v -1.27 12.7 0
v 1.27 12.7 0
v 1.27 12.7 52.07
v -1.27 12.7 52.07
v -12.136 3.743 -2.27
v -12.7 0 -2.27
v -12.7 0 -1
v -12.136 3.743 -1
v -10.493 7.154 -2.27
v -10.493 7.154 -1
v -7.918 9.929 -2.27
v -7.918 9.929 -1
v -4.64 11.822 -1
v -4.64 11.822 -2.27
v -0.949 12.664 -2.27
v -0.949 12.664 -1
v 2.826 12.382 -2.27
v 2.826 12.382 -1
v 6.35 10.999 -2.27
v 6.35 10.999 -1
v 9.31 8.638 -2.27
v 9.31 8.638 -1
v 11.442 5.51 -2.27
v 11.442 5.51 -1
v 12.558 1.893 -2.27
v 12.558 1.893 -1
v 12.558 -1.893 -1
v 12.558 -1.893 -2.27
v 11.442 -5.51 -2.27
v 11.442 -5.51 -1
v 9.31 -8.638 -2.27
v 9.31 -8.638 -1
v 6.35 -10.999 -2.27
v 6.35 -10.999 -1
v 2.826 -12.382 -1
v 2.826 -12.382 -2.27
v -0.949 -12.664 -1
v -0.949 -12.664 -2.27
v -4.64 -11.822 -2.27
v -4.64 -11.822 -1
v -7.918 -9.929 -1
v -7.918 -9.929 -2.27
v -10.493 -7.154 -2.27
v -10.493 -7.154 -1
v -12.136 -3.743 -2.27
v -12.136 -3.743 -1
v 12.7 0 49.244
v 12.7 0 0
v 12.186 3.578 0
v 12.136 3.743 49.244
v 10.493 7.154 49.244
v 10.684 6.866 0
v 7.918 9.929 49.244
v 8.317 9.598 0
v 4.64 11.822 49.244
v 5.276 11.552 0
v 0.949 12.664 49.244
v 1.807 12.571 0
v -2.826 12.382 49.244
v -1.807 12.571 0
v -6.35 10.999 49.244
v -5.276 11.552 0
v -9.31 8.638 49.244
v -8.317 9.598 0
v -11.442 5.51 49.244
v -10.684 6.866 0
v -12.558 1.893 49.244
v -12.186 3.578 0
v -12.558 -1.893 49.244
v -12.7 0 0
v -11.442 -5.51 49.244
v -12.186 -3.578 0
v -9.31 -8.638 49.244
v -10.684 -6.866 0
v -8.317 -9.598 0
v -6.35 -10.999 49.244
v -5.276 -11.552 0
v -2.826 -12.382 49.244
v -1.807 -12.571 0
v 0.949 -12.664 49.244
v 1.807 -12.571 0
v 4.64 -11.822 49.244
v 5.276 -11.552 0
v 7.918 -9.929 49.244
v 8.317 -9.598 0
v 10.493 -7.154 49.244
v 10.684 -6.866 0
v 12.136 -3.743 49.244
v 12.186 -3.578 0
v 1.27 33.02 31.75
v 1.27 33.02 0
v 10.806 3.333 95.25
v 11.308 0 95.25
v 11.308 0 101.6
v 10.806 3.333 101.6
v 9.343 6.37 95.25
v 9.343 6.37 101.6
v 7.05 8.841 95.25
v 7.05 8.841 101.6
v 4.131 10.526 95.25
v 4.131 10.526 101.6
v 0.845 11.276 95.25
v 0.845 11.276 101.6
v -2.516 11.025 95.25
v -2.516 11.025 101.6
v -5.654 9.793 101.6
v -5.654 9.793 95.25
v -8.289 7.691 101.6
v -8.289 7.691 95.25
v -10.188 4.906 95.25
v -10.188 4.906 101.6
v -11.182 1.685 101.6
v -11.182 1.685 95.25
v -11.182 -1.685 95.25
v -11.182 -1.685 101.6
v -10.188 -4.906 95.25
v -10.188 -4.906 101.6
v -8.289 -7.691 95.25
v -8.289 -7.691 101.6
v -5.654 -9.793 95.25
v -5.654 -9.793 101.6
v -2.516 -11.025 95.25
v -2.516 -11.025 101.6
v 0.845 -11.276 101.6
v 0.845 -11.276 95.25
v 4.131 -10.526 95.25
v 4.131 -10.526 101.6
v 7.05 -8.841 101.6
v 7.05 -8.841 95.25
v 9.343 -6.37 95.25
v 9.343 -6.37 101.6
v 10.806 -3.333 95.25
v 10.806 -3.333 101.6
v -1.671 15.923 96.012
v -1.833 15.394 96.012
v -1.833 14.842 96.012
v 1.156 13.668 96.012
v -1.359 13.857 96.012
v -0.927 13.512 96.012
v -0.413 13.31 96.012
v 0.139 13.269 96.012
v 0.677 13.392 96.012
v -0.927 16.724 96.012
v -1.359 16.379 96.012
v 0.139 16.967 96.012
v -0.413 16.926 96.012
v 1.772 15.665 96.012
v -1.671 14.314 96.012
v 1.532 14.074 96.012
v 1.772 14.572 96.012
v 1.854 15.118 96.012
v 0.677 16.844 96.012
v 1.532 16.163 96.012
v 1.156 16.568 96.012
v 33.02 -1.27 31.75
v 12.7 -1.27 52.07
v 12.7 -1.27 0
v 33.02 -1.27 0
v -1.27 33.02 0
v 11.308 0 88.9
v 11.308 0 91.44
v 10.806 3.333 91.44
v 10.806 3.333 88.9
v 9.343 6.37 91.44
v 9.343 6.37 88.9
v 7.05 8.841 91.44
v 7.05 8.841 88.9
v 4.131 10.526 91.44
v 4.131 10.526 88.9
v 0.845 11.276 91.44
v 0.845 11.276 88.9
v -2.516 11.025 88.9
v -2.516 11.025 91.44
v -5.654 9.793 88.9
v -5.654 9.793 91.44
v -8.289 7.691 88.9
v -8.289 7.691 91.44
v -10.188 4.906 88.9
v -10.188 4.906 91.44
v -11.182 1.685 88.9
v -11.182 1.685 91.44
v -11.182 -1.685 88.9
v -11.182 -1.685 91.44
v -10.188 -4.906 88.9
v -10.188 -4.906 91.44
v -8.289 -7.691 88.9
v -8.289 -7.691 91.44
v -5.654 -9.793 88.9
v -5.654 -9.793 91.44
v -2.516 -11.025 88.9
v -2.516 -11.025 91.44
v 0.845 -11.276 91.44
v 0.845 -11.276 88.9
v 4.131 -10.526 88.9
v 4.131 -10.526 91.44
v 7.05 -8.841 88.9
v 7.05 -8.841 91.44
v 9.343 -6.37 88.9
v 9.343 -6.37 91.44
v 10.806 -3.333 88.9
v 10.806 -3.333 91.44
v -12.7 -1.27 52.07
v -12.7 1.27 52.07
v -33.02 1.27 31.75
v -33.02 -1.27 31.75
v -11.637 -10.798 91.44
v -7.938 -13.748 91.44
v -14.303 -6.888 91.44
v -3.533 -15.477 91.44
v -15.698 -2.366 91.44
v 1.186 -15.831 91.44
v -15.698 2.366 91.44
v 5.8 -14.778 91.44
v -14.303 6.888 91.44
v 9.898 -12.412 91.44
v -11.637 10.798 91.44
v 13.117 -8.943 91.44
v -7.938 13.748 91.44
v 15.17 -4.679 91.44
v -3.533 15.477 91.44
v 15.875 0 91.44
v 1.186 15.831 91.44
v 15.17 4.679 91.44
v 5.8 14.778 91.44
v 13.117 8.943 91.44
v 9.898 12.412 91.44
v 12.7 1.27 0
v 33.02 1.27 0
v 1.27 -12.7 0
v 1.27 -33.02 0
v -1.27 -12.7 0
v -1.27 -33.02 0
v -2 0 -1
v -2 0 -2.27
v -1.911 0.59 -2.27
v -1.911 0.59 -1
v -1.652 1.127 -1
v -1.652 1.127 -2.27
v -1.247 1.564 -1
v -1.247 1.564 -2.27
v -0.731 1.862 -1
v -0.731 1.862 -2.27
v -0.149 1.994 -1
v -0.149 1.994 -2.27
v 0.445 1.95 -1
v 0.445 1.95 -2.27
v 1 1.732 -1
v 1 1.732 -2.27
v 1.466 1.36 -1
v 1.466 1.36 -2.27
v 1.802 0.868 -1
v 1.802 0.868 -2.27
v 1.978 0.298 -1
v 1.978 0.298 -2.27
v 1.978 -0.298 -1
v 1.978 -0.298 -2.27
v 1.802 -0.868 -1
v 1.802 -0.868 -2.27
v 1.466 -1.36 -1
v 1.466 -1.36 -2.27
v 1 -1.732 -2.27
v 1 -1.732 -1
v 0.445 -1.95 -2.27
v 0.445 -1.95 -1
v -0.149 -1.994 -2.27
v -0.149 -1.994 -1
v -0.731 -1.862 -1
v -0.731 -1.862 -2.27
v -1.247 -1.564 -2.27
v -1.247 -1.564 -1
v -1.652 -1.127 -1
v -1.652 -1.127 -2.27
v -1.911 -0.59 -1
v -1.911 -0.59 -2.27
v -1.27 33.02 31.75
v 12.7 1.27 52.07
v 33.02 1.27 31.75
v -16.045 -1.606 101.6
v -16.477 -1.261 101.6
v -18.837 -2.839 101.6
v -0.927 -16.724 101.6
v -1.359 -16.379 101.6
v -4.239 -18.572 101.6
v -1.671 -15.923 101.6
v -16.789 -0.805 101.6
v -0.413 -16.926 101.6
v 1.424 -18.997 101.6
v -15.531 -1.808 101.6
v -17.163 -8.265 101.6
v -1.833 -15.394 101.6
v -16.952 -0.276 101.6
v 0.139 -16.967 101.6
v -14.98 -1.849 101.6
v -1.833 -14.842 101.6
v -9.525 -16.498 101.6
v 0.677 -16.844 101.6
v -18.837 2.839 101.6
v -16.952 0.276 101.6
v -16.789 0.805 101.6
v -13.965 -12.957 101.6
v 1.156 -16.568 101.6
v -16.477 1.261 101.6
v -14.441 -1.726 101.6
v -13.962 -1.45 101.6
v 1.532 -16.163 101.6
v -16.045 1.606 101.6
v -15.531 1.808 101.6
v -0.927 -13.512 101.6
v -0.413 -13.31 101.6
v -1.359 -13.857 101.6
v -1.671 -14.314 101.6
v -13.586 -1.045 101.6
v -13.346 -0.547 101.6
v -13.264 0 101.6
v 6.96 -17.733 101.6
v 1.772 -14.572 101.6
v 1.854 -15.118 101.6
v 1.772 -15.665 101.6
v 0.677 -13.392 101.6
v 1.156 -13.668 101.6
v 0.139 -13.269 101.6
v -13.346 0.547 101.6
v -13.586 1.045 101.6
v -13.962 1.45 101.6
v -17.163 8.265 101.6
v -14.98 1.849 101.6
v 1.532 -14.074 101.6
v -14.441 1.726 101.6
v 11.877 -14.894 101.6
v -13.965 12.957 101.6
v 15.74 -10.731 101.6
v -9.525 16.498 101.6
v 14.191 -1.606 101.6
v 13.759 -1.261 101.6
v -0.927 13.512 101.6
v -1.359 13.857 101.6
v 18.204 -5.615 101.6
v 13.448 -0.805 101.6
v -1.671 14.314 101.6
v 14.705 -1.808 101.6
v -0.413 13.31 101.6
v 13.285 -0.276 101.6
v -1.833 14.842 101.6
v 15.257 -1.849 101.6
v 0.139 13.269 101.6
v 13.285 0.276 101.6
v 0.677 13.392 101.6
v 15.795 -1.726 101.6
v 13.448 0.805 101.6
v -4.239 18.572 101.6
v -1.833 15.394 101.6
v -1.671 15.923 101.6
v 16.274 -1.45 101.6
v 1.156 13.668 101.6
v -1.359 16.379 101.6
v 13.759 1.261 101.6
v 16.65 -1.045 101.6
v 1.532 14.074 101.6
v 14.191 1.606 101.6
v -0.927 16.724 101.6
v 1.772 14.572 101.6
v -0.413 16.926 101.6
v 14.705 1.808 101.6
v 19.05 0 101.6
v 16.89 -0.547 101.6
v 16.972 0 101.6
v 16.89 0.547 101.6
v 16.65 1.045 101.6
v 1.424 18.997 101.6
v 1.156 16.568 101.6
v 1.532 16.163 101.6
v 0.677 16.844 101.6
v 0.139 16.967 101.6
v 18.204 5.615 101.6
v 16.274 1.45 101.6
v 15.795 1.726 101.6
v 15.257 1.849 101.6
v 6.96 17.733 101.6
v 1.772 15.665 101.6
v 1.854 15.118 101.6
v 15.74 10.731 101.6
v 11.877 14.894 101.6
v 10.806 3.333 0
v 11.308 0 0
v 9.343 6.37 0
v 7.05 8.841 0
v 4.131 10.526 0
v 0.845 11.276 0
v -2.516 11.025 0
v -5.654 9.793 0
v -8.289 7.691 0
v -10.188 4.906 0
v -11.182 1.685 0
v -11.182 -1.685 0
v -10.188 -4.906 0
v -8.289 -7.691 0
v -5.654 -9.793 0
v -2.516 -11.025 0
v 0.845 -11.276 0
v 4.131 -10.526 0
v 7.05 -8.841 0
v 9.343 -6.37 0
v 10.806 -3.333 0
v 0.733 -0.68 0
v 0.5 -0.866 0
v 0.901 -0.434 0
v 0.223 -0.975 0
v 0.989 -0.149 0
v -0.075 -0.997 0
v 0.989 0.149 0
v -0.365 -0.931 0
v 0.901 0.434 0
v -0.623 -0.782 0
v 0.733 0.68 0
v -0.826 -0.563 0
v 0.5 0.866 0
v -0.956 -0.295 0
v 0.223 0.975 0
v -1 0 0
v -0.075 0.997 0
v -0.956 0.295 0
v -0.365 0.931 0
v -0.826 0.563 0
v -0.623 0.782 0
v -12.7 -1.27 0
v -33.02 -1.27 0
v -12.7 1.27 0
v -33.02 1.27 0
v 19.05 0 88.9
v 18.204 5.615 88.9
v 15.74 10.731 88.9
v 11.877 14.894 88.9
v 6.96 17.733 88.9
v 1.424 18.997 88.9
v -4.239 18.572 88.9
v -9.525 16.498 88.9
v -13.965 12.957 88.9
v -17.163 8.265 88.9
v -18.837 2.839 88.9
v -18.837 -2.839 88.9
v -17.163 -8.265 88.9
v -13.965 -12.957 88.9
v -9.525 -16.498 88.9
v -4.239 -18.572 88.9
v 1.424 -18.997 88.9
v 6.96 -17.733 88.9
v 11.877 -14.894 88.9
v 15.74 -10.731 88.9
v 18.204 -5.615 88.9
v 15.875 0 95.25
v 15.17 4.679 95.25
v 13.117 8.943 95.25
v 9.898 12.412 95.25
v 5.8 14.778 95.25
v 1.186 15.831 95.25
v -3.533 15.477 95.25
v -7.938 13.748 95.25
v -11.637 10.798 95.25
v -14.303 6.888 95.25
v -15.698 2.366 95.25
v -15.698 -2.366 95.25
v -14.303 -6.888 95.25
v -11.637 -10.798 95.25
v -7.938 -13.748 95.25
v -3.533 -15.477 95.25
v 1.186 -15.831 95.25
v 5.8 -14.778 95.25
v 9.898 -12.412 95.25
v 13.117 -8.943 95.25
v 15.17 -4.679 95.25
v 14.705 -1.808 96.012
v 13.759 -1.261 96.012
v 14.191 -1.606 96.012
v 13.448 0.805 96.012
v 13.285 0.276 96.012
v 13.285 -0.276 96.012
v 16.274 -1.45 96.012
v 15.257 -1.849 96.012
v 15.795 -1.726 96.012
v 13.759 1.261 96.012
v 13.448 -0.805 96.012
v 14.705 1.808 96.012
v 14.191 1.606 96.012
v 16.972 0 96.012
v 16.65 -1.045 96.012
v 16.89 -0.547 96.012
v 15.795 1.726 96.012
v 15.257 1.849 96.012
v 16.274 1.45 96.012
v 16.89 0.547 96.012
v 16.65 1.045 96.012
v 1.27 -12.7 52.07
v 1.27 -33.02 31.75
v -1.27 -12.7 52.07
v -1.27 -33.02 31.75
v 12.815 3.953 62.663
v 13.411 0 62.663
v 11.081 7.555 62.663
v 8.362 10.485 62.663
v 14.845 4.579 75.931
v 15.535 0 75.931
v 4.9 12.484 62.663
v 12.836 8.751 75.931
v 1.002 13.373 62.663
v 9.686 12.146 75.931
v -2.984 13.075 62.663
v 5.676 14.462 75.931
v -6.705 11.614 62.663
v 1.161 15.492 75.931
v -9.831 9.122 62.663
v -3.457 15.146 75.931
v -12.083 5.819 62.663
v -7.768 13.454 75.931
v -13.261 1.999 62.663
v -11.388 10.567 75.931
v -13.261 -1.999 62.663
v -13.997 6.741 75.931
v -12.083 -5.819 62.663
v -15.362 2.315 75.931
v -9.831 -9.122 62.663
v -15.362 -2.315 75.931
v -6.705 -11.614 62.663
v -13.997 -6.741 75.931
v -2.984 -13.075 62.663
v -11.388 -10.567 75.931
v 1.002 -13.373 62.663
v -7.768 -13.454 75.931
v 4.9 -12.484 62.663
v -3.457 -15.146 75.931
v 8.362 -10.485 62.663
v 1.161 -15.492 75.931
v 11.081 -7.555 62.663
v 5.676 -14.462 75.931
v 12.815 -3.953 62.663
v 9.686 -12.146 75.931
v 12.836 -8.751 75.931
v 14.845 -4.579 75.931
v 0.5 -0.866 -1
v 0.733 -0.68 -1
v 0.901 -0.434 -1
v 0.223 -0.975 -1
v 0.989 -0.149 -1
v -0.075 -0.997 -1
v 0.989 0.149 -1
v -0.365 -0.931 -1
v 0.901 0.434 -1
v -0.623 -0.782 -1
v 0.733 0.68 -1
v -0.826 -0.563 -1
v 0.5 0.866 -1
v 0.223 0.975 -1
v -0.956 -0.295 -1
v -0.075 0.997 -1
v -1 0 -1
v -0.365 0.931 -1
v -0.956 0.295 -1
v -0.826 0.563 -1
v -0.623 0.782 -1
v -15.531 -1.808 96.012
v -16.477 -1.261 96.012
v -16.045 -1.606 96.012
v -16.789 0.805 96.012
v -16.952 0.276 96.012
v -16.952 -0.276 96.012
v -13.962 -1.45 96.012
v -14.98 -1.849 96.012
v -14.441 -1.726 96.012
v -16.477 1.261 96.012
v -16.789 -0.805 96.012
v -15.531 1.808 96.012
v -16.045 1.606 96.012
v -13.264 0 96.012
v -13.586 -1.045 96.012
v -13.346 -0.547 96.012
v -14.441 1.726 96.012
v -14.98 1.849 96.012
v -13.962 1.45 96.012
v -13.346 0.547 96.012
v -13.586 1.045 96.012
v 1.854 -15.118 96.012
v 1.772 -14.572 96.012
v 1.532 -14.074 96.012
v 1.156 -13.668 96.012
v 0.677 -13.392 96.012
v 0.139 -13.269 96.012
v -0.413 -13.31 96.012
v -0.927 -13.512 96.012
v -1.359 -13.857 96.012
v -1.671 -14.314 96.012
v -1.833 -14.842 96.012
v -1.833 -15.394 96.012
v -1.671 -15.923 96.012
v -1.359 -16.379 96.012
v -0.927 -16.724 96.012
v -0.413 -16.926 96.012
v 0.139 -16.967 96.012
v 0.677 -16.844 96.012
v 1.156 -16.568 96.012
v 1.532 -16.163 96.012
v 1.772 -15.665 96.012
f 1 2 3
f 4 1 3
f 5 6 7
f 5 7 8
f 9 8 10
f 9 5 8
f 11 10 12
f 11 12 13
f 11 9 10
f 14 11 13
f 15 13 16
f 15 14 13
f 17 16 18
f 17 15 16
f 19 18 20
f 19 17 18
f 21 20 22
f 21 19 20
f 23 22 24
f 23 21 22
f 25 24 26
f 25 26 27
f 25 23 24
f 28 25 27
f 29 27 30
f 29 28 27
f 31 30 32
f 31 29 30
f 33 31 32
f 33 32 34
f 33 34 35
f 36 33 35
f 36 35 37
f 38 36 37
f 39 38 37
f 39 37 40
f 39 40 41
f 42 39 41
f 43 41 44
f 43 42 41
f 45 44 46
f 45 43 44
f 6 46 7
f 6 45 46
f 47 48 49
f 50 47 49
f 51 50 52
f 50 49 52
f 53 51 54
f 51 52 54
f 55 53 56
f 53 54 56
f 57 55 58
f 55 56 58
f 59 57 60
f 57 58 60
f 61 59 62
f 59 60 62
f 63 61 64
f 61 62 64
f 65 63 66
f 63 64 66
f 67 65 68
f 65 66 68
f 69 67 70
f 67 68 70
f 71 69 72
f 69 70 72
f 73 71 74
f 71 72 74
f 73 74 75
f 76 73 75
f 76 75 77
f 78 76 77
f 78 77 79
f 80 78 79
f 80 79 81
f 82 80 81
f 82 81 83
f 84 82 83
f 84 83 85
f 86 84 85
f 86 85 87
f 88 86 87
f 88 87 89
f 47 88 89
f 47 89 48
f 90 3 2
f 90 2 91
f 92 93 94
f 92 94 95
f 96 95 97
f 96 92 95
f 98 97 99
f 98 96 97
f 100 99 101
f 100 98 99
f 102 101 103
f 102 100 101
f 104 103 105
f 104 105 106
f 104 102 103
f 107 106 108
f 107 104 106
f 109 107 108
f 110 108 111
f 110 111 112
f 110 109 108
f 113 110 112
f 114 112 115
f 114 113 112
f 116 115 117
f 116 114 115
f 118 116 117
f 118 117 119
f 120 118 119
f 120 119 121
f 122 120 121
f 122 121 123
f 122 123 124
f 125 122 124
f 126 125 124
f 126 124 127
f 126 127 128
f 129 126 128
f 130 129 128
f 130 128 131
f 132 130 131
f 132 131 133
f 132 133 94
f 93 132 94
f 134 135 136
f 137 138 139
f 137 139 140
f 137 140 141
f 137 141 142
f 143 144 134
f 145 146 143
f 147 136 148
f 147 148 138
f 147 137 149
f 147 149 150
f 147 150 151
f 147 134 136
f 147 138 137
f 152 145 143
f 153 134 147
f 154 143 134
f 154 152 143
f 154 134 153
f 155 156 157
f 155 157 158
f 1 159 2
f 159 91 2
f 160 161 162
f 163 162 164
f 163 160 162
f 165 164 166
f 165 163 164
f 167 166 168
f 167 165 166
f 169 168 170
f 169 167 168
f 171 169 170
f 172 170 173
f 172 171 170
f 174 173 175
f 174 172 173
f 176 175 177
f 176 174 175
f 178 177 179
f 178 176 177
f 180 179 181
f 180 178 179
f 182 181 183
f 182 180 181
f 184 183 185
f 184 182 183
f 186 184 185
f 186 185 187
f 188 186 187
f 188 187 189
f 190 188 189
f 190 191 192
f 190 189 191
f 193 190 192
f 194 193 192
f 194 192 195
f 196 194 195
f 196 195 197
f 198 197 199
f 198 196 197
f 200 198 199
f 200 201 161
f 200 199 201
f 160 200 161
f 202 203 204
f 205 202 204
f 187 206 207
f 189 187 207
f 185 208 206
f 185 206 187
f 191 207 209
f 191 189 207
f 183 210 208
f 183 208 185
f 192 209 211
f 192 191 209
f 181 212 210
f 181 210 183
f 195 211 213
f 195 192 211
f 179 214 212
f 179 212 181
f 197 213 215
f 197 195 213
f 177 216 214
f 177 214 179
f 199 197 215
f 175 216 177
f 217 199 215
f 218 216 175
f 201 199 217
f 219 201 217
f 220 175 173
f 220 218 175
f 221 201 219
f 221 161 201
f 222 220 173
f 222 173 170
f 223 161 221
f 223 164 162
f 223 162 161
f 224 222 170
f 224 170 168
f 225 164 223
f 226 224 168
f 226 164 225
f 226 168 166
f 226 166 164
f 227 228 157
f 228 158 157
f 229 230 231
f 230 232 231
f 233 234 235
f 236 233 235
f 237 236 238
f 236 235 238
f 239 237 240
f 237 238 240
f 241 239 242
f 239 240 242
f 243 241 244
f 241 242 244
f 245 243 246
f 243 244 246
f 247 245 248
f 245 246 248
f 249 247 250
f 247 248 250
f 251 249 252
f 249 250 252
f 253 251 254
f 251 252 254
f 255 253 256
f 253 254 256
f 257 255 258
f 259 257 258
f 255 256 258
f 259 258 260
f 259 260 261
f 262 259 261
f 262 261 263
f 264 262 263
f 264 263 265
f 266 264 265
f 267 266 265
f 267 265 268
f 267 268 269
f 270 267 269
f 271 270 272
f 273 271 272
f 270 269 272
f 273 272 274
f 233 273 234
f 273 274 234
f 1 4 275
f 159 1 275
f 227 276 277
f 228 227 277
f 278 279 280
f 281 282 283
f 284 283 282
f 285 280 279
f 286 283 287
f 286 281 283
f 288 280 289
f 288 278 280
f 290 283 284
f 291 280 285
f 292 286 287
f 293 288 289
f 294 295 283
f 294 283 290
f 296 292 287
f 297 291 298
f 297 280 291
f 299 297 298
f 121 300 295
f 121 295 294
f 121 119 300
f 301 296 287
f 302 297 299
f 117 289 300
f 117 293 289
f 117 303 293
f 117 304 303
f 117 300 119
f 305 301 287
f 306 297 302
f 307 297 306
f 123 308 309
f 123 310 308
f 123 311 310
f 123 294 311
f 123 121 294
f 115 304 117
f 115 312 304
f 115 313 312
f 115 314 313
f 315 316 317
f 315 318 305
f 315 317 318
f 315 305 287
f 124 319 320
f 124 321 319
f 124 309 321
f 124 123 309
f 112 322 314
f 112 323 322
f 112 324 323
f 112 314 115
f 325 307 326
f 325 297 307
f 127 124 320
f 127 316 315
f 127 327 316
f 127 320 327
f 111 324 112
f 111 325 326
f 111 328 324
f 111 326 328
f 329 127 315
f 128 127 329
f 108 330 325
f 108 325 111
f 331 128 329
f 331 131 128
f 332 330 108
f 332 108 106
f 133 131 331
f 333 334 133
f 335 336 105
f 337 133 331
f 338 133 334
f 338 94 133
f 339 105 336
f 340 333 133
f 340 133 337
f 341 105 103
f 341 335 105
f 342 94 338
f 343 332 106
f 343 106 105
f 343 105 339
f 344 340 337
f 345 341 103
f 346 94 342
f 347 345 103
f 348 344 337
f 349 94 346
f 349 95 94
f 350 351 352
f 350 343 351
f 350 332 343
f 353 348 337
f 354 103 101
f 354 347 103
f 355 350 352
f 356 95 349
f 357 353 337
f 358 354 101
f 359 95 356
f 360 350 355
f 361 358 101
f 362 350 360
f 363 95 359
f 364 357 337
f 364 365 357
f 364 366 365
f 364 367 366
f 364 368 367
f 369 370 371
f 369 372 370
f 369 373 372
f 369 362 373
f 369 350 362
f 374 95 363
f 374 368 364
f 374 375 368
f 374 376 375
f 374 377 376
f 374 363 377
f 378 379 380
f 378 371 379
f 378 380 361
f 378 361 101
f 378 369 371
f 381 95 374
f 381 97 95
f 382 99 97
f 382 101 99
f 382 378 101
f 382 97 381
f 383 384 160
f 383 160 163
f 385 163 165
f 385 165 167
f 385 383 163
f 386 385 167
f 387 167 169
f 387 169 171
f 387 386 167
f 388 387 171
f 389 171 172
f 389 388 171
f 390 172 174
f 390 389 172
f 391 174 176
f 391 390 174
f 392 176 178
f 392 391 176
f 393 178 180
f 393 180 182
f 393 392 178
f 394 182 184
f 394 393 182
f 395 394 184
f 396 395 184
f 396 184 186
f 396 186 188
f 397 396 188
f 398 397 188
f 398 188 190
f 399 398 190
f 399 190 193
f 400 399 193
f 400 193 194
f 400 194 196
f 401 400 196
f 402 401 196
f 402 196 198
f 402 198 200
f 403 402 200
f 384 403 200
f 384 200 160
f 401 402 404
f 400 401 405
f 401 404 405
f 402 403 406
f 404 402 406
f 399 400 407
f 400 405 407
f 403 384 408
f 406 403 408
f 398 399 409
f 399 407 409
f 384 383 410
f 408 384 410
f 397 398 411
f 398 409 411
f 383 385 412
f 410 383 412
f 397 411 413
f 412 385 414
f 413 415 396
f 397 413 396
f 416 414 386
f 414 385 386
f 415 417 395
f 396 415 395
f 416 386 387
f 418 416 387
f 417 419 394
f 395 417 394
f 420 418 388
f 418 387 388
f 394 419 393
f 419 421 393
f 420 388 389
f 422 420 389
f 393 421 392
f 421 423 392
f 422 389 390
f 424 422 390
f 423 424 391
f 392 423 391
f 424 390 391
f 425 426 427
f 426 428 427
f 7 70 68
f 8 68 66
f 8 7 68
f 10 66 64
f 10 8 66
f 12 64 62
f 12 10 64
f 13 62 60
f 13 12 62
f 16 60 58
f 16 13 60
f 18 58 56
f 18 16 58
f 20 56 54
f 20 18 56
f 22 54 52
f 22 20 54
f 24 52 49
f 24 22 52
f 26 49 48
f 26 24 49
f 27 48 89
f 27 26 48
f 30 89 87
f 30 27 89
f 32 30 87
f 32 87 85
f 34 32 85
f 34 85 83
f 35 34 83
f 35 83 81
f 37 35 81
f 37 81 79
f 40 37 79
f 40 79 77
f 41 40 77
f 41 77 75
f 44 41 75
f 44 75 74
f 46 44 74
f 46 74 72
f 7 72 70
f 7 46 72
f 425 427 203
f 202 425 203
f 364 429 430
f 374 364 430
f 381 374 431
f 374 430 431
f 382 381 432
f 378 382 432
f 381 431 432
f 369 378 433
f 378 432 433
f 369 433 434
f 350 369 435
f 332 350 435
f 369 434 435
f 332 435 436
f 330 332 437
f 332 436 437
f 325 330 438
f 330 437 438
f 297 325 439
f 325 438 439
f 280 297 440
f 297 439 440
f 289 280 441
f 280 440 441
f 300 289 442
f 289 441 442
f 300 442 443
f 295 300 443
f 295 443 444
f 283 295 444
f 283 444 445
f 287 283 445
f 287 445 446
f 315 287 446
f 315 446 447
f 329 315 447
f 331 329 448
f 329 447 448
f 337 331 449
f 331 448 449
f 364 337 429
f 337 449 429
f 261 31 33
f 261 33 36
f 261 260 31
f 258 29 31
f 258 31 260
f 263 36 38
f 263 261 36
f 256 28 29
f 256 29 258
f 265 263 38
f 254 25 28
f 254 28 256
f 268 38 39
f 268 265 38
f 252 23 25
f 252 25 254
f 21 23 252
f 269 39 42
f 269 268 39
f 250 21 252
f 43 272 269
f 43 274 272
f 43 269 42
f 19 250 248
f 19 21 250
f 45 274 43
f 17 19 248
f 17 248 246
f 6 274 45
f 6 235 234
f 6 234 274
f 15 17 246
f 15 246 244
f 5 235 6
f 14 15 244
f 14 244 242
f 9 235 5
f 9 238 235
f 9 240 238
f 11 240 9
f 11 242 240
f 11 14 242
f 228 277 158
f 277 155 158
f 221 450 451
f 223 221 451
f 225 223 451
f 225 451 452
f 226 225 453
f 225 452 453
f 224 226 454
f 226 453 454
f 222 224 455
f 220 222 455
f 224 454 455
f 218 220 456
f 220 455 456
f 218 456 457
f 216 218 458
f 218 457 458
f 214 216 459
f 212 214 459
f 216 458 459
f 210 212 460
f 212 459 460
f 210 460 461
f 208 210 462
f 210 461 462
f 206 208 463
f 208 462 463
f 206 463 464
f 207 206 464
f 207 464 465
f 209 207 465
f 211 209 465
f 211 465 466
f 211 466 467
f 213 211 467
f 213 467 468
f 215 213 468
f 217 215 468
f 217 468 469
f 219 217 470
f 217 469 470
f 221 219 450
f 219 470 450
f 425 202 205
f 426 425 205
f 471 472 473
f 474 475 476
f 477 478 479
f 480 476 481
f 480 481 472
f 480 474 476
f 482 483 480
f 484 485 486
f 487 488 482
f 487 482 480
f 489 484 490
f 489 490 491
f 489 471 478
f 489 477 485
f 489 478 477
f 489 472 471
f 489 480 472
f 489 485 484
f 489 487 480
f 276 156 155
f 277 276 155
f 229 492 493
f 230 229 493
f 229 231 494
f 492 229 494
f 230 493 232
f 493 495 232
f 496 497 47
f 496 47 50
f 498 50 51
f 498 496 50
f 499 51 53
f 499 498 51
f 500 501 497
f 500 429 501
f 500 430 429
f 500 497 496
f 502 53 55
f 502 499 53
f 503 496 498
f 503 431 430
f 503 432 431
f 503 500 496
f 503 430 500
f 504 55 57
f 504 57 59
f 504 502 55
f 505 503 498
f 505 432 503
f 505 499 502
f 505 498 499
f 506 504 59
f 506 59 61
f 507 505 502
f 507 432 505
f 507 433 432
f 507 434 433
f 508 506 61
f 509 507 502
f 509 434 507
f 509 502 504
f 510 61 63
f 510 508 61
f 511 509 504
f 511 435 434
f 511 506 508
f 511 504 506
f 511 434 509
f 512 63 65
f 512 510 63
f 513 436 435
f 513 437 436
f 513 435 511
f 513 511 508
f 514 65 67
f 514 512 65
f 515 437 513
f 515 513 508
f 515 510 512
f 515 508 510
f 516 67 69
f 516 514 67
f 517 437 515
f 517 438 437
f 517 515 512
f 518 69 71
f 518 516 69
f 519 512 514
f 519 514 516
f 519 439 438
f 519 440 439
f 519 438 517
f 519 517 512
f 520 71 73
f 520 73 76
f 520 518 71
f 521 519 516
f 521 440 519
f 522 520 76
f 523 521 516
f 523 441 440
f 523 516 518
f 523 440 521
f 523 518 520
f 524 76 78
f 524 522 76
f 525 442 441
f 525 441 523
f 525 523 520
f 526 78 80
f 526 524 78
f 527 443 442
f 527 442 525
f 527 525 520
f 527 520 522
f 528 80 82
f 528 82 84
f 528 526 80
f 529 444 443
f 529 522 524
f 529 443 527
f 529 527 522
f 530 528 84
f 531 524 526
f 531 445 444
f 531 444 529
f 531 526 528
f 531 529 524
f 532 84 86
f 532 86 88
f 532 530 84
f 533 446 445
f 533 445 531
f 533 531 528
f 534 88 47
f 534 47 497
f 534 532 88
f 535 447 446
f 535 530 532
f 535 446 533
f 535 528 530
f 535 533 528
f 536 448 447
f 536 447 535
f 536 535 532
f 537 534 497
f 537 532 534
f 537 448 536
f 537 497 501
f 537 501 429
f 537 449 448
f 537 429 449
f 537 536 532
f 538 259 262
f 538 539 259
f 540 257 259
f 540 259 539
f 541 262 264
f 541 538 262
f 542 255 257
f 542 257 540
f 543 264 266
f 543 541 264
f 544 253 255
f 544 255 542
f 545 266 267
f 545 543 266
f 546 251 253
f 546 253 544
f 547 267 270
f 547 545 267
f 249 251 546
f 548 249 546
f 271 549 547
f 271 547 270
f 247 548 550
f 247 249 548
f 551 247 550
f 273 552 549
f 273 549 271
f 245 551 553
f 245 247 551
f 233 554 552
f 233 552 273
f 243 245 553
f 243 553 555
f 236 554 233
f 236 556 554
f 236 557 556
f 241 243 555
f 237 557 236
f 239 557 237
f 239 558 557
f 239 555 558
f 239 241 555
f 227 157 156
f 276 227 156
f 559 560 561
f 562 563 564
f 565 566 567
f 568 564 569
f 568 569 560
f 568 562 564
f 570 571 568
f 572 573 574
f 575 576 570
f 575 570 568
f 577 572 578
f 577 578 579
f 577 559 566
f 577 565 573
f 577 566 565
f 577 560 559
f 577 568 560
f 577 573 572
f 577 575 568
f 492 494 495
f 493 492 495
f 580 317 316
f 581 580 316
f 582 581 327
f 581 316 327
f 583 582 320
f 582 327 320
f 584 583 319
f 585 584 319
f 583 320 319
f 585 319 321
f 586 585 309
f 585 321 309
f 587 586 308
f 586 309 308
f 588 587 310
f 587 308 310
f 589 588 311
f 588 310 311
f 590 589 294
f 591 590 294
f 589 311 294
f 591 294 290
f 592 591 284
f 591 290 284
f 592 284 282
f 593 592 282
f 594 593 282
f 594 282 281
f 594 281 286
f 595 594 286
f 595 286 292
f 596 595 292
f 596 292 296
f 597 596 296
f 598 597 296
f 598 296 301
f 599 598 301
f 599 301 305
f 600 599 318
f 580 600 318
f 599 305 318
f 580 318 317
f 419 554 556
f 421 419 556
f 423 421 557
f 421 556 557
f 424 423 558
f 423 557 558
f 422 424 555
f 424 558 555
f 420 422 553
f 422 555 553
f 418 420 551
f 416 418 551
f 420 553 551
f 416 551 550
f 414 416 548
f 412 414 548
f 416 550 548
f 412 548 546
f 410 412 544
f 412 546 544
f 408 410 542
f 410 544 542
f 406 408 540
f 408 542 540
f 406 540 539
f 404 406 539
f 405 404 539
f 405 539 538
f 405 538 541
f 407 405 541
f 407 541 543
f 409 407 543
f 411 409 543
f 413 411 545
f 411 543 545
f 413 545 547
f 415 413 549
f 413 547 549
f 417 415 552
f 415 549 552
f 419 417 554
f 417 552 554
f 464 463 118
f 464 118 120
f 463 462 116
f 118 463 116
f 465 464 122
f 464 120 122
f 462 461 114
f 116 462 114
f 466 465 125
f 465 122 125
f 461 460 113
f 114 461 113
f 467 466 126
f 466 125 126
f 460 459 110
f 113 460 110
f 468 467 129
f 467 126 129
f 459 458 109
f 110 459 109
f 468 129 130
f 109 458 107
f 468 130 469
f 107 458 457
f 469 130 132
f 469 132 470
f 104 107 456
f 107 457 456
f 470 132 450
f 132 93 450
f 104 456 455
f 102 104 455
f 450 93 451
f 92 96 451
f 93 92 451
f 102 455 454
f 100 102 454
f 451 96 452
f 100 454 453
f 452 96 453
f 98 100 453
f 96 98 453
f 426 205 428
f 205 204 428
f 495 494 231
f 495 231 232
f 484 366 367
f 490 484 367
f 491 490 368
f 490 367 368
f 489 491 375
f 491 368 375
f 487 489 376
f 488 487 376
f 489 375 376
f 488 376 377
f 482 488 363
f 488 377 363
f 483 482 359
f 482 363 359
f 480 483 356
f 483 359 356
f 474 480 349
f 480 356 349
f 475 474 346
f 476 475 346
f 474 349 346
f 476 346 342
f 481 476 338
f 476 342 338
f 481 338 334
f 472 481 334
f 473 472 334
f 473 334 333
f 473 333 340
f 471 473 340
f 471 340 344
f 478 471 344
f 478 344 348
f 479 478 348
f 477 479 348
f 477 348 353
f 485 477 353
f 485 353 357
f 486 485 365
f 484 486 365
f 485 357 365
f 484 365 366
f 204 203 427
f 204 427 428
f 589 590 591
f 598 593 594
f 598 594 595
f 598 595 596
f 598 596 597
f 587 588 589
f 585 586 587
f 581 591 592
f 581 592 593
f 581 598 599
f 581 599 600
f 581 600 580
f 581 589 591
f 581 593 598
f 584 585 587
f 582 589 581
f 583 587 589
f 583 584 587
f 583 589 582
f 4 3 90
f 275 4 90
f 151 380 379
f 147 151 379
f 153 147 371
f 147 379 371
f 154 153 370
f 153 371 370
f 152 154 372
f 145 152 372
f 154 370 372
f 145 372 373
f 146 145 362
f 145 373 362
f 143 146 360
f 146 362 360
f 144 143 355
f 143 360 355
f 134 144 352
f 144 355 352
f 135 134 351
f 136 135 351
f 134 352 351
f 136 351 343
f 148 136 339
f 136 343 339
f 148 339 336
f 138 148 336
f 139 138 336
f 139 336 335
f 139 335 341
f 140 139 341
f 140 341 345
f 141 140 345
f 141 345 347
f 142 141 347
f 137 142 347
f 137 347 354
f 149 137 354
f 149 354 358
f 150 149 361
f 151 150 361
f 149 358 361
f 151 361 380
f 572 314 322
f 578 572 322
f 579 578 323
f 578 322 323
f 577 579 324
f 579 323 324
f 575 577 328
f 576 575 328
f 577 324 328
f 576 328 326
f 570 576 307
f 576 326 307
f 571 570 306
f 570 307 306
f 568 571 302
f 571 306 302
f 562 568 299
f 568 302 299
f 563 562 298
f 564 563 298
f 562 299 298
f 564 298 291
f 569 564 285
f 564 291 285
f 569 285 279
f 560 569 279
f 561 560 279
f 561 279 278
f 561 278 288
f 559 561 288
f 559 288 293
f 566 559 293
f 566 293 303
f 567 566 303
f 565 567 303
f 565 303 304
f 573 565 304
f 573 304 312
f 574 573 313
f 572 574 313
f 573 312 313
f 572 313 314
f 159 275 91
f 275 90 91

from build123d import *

# Parameters (mm, degrees)
SKETCH1_R              = 12.7
SKETCH1_R_2            = 11.30808
BOSS_EXTRUDE1_DEPTH    = 101.6
BOSS_EXTRUDE4_DEPTH    = 1.27
CIRPATTERN6_COUNT      = 4
BOSS_EXTRUDE5_START    = 1
SKETCH3_R              = 12.7
SKETCH3_R_2            = 1
BOSS_EXTRUDE5_DEPTH    = 1
O_RING_START           = 1.27
SKETCH4_R              = 12.7
SKETCH4_R_2            = 2
O_RING_BODY_HOLD_DEPTH = 1.27
BOSS_EXTRUDE8_START    = -12.7
SKETCH37_R             = 19.05
SKETCH37_R_2           = 11.30808
BOSS_EXTRUDE8_DEPTH    = 12.7
SKETCH38_R             = 1.8542
CUT_EXTRUDE1_DEPTH     = 5.588
SKETCH39_R             = 15.875
SKETCH39_R_2           = 10.16
CUT_EXTRUDE2_DEPTH     = 3.81


with BuildPart() as part:
    # Sketch1 → Boss-Extrude1 (new body)
    with BuildSketch(Plane.XY):
        Circle(SKETCH1_R)
        Circle(SKETCH1_R_2, mode=Mode.SUBTRACT)
    extrude(amount=BOSS_EXTRUDE1_DEPTH)

    # Sketch3 → Boss-Extrude5 (add)
    with BuildSketch(Plane(origin=(0, 0, 0), x_dir=(-1, 0, 0), z_dir=(0, 0, -1)).offset(BOSS_EXTRUDE5_START)):
        Circle(SKETCH3_R)
        Circle(SKETCH3_R_2, mode=Mode.SUBTRACT)
    extrude(amount=-BOSS_EXTRUDE5_DEPTH)

    # Sketch4 → O-Ring Body Hold (add)
    with BuildSketch(Plane(origin=(0, 0, -1), x_dir=(-1, 0, 0), z_dir=(0, 0, -1)).offset(O_RING_START)):
        Circle(SKETCH4_R)
        Circle(SKETCH4_R_2, mode=Mode.SUBTRACT)
    extrude(amount=-O_RING_BODY_HOLD_DEPTH)

    # Sketch37 → Boss-Extrude8 (add)
    with BuildSketch(Plane.XY.offset(101.6).offset(BOSS_EXTRUDE8_START)):
        Circle(SKETCH37_R)
        Circle(SKETCH37_R_2, mode=Mode.SUBTRACT)
    extrude(amount=BOSS_EXTRUDE8_DEPTH)

    # Sketch38 → Cut-Extrude1 (cut)
    with BuildSketch(Plane.XY.offset(101.6)):
        with Locations((-15.11808, 0)):
            Circle(SKETCH38_R)
        with Locations((0, 15.11808)):
            Circle(SKETCH38_R)
        with Locations((15.11808, 0)):
            Circle(SKETCH38_R)
        with Locations((0, -15.11808)):
            Circle(SKETCH38_R)
    extrude(amount=-CUT_EXTRUDE1_DEPTH, mode=Mode.SUBTRACT)

    # Fillet2: read off the stored shape, not the designer's step
    # Fillet2 outline → Fillet2 (revolve)
    with BuildSketch(Plane.XZ):
        with BuildLine():
            ThreePointArc((12.7, 49.24426271), (14.297547871, 69.324725852), (19.05, 88.9))
            Line((19.05, 88.9), (12.7, 88.9))
            Line((12.7, 88.9), (12.7, 49.24426271))
        make_face()
    revolve(axis=Axis((0, 0, 0), (0, 0, 1)))

    # Sketch39 → Cut-Extrude2 (cut)
    with BuildSketch(Plane.XY.offset(95.25)):
        Circle(SKETCH39_R)
        Circle(SKETCH39_R_2, mode=Mode.SUBTRACT)
    extrude(amount=-CUT_EXTRUDE2_DEPTH, mode=Mode.SUBTRACT)


with BuildPart() as body_2:
    # Sketch2 → Boss-Extrude4 (new, symmetric)
    with BuildSketch(Plane(origin=(0, 0, 0), x_dir=(1, 0, 0), z_dir=(0, 1, 0))):
        Polygon((-12.7, -52.07), (-33.02, -31.75), (-33.02, 0), (-12.7, 0), align=None)
    extrude(amount=BOSS_EXTRUDE4_DEPTH, both=True)


with BuildPart() as cirpattern6_1:
    # CirPattern6: pattern copy
    add(body_2.part.rotate(Axis((0, 0, 0), (0, 0, 1)), 1 * 360 / CIRPATTERN6_COUNT))


with BuildPart() as cirpattern6_2:
    # CirPattern6: pattern copy
    add(body_2.part.rotate(Axis((0, 0, 0), (0, 0, 1)), 2 * 360 / CIRPATTERN6_COUNT))


with BuildPart() as cirpattern6_3:
    # CirPattern6: pattern copy
    add(body_2.part.rotate(Axis((0, 0, 0), (0, 0, 1)), 3 * 360 / CIRPATTERN6_COUNT))


solid = Compound([part.part, body_2.part, cirpattern6_1.part, cirpattern6_2.part, cirpattern6_3.part])
